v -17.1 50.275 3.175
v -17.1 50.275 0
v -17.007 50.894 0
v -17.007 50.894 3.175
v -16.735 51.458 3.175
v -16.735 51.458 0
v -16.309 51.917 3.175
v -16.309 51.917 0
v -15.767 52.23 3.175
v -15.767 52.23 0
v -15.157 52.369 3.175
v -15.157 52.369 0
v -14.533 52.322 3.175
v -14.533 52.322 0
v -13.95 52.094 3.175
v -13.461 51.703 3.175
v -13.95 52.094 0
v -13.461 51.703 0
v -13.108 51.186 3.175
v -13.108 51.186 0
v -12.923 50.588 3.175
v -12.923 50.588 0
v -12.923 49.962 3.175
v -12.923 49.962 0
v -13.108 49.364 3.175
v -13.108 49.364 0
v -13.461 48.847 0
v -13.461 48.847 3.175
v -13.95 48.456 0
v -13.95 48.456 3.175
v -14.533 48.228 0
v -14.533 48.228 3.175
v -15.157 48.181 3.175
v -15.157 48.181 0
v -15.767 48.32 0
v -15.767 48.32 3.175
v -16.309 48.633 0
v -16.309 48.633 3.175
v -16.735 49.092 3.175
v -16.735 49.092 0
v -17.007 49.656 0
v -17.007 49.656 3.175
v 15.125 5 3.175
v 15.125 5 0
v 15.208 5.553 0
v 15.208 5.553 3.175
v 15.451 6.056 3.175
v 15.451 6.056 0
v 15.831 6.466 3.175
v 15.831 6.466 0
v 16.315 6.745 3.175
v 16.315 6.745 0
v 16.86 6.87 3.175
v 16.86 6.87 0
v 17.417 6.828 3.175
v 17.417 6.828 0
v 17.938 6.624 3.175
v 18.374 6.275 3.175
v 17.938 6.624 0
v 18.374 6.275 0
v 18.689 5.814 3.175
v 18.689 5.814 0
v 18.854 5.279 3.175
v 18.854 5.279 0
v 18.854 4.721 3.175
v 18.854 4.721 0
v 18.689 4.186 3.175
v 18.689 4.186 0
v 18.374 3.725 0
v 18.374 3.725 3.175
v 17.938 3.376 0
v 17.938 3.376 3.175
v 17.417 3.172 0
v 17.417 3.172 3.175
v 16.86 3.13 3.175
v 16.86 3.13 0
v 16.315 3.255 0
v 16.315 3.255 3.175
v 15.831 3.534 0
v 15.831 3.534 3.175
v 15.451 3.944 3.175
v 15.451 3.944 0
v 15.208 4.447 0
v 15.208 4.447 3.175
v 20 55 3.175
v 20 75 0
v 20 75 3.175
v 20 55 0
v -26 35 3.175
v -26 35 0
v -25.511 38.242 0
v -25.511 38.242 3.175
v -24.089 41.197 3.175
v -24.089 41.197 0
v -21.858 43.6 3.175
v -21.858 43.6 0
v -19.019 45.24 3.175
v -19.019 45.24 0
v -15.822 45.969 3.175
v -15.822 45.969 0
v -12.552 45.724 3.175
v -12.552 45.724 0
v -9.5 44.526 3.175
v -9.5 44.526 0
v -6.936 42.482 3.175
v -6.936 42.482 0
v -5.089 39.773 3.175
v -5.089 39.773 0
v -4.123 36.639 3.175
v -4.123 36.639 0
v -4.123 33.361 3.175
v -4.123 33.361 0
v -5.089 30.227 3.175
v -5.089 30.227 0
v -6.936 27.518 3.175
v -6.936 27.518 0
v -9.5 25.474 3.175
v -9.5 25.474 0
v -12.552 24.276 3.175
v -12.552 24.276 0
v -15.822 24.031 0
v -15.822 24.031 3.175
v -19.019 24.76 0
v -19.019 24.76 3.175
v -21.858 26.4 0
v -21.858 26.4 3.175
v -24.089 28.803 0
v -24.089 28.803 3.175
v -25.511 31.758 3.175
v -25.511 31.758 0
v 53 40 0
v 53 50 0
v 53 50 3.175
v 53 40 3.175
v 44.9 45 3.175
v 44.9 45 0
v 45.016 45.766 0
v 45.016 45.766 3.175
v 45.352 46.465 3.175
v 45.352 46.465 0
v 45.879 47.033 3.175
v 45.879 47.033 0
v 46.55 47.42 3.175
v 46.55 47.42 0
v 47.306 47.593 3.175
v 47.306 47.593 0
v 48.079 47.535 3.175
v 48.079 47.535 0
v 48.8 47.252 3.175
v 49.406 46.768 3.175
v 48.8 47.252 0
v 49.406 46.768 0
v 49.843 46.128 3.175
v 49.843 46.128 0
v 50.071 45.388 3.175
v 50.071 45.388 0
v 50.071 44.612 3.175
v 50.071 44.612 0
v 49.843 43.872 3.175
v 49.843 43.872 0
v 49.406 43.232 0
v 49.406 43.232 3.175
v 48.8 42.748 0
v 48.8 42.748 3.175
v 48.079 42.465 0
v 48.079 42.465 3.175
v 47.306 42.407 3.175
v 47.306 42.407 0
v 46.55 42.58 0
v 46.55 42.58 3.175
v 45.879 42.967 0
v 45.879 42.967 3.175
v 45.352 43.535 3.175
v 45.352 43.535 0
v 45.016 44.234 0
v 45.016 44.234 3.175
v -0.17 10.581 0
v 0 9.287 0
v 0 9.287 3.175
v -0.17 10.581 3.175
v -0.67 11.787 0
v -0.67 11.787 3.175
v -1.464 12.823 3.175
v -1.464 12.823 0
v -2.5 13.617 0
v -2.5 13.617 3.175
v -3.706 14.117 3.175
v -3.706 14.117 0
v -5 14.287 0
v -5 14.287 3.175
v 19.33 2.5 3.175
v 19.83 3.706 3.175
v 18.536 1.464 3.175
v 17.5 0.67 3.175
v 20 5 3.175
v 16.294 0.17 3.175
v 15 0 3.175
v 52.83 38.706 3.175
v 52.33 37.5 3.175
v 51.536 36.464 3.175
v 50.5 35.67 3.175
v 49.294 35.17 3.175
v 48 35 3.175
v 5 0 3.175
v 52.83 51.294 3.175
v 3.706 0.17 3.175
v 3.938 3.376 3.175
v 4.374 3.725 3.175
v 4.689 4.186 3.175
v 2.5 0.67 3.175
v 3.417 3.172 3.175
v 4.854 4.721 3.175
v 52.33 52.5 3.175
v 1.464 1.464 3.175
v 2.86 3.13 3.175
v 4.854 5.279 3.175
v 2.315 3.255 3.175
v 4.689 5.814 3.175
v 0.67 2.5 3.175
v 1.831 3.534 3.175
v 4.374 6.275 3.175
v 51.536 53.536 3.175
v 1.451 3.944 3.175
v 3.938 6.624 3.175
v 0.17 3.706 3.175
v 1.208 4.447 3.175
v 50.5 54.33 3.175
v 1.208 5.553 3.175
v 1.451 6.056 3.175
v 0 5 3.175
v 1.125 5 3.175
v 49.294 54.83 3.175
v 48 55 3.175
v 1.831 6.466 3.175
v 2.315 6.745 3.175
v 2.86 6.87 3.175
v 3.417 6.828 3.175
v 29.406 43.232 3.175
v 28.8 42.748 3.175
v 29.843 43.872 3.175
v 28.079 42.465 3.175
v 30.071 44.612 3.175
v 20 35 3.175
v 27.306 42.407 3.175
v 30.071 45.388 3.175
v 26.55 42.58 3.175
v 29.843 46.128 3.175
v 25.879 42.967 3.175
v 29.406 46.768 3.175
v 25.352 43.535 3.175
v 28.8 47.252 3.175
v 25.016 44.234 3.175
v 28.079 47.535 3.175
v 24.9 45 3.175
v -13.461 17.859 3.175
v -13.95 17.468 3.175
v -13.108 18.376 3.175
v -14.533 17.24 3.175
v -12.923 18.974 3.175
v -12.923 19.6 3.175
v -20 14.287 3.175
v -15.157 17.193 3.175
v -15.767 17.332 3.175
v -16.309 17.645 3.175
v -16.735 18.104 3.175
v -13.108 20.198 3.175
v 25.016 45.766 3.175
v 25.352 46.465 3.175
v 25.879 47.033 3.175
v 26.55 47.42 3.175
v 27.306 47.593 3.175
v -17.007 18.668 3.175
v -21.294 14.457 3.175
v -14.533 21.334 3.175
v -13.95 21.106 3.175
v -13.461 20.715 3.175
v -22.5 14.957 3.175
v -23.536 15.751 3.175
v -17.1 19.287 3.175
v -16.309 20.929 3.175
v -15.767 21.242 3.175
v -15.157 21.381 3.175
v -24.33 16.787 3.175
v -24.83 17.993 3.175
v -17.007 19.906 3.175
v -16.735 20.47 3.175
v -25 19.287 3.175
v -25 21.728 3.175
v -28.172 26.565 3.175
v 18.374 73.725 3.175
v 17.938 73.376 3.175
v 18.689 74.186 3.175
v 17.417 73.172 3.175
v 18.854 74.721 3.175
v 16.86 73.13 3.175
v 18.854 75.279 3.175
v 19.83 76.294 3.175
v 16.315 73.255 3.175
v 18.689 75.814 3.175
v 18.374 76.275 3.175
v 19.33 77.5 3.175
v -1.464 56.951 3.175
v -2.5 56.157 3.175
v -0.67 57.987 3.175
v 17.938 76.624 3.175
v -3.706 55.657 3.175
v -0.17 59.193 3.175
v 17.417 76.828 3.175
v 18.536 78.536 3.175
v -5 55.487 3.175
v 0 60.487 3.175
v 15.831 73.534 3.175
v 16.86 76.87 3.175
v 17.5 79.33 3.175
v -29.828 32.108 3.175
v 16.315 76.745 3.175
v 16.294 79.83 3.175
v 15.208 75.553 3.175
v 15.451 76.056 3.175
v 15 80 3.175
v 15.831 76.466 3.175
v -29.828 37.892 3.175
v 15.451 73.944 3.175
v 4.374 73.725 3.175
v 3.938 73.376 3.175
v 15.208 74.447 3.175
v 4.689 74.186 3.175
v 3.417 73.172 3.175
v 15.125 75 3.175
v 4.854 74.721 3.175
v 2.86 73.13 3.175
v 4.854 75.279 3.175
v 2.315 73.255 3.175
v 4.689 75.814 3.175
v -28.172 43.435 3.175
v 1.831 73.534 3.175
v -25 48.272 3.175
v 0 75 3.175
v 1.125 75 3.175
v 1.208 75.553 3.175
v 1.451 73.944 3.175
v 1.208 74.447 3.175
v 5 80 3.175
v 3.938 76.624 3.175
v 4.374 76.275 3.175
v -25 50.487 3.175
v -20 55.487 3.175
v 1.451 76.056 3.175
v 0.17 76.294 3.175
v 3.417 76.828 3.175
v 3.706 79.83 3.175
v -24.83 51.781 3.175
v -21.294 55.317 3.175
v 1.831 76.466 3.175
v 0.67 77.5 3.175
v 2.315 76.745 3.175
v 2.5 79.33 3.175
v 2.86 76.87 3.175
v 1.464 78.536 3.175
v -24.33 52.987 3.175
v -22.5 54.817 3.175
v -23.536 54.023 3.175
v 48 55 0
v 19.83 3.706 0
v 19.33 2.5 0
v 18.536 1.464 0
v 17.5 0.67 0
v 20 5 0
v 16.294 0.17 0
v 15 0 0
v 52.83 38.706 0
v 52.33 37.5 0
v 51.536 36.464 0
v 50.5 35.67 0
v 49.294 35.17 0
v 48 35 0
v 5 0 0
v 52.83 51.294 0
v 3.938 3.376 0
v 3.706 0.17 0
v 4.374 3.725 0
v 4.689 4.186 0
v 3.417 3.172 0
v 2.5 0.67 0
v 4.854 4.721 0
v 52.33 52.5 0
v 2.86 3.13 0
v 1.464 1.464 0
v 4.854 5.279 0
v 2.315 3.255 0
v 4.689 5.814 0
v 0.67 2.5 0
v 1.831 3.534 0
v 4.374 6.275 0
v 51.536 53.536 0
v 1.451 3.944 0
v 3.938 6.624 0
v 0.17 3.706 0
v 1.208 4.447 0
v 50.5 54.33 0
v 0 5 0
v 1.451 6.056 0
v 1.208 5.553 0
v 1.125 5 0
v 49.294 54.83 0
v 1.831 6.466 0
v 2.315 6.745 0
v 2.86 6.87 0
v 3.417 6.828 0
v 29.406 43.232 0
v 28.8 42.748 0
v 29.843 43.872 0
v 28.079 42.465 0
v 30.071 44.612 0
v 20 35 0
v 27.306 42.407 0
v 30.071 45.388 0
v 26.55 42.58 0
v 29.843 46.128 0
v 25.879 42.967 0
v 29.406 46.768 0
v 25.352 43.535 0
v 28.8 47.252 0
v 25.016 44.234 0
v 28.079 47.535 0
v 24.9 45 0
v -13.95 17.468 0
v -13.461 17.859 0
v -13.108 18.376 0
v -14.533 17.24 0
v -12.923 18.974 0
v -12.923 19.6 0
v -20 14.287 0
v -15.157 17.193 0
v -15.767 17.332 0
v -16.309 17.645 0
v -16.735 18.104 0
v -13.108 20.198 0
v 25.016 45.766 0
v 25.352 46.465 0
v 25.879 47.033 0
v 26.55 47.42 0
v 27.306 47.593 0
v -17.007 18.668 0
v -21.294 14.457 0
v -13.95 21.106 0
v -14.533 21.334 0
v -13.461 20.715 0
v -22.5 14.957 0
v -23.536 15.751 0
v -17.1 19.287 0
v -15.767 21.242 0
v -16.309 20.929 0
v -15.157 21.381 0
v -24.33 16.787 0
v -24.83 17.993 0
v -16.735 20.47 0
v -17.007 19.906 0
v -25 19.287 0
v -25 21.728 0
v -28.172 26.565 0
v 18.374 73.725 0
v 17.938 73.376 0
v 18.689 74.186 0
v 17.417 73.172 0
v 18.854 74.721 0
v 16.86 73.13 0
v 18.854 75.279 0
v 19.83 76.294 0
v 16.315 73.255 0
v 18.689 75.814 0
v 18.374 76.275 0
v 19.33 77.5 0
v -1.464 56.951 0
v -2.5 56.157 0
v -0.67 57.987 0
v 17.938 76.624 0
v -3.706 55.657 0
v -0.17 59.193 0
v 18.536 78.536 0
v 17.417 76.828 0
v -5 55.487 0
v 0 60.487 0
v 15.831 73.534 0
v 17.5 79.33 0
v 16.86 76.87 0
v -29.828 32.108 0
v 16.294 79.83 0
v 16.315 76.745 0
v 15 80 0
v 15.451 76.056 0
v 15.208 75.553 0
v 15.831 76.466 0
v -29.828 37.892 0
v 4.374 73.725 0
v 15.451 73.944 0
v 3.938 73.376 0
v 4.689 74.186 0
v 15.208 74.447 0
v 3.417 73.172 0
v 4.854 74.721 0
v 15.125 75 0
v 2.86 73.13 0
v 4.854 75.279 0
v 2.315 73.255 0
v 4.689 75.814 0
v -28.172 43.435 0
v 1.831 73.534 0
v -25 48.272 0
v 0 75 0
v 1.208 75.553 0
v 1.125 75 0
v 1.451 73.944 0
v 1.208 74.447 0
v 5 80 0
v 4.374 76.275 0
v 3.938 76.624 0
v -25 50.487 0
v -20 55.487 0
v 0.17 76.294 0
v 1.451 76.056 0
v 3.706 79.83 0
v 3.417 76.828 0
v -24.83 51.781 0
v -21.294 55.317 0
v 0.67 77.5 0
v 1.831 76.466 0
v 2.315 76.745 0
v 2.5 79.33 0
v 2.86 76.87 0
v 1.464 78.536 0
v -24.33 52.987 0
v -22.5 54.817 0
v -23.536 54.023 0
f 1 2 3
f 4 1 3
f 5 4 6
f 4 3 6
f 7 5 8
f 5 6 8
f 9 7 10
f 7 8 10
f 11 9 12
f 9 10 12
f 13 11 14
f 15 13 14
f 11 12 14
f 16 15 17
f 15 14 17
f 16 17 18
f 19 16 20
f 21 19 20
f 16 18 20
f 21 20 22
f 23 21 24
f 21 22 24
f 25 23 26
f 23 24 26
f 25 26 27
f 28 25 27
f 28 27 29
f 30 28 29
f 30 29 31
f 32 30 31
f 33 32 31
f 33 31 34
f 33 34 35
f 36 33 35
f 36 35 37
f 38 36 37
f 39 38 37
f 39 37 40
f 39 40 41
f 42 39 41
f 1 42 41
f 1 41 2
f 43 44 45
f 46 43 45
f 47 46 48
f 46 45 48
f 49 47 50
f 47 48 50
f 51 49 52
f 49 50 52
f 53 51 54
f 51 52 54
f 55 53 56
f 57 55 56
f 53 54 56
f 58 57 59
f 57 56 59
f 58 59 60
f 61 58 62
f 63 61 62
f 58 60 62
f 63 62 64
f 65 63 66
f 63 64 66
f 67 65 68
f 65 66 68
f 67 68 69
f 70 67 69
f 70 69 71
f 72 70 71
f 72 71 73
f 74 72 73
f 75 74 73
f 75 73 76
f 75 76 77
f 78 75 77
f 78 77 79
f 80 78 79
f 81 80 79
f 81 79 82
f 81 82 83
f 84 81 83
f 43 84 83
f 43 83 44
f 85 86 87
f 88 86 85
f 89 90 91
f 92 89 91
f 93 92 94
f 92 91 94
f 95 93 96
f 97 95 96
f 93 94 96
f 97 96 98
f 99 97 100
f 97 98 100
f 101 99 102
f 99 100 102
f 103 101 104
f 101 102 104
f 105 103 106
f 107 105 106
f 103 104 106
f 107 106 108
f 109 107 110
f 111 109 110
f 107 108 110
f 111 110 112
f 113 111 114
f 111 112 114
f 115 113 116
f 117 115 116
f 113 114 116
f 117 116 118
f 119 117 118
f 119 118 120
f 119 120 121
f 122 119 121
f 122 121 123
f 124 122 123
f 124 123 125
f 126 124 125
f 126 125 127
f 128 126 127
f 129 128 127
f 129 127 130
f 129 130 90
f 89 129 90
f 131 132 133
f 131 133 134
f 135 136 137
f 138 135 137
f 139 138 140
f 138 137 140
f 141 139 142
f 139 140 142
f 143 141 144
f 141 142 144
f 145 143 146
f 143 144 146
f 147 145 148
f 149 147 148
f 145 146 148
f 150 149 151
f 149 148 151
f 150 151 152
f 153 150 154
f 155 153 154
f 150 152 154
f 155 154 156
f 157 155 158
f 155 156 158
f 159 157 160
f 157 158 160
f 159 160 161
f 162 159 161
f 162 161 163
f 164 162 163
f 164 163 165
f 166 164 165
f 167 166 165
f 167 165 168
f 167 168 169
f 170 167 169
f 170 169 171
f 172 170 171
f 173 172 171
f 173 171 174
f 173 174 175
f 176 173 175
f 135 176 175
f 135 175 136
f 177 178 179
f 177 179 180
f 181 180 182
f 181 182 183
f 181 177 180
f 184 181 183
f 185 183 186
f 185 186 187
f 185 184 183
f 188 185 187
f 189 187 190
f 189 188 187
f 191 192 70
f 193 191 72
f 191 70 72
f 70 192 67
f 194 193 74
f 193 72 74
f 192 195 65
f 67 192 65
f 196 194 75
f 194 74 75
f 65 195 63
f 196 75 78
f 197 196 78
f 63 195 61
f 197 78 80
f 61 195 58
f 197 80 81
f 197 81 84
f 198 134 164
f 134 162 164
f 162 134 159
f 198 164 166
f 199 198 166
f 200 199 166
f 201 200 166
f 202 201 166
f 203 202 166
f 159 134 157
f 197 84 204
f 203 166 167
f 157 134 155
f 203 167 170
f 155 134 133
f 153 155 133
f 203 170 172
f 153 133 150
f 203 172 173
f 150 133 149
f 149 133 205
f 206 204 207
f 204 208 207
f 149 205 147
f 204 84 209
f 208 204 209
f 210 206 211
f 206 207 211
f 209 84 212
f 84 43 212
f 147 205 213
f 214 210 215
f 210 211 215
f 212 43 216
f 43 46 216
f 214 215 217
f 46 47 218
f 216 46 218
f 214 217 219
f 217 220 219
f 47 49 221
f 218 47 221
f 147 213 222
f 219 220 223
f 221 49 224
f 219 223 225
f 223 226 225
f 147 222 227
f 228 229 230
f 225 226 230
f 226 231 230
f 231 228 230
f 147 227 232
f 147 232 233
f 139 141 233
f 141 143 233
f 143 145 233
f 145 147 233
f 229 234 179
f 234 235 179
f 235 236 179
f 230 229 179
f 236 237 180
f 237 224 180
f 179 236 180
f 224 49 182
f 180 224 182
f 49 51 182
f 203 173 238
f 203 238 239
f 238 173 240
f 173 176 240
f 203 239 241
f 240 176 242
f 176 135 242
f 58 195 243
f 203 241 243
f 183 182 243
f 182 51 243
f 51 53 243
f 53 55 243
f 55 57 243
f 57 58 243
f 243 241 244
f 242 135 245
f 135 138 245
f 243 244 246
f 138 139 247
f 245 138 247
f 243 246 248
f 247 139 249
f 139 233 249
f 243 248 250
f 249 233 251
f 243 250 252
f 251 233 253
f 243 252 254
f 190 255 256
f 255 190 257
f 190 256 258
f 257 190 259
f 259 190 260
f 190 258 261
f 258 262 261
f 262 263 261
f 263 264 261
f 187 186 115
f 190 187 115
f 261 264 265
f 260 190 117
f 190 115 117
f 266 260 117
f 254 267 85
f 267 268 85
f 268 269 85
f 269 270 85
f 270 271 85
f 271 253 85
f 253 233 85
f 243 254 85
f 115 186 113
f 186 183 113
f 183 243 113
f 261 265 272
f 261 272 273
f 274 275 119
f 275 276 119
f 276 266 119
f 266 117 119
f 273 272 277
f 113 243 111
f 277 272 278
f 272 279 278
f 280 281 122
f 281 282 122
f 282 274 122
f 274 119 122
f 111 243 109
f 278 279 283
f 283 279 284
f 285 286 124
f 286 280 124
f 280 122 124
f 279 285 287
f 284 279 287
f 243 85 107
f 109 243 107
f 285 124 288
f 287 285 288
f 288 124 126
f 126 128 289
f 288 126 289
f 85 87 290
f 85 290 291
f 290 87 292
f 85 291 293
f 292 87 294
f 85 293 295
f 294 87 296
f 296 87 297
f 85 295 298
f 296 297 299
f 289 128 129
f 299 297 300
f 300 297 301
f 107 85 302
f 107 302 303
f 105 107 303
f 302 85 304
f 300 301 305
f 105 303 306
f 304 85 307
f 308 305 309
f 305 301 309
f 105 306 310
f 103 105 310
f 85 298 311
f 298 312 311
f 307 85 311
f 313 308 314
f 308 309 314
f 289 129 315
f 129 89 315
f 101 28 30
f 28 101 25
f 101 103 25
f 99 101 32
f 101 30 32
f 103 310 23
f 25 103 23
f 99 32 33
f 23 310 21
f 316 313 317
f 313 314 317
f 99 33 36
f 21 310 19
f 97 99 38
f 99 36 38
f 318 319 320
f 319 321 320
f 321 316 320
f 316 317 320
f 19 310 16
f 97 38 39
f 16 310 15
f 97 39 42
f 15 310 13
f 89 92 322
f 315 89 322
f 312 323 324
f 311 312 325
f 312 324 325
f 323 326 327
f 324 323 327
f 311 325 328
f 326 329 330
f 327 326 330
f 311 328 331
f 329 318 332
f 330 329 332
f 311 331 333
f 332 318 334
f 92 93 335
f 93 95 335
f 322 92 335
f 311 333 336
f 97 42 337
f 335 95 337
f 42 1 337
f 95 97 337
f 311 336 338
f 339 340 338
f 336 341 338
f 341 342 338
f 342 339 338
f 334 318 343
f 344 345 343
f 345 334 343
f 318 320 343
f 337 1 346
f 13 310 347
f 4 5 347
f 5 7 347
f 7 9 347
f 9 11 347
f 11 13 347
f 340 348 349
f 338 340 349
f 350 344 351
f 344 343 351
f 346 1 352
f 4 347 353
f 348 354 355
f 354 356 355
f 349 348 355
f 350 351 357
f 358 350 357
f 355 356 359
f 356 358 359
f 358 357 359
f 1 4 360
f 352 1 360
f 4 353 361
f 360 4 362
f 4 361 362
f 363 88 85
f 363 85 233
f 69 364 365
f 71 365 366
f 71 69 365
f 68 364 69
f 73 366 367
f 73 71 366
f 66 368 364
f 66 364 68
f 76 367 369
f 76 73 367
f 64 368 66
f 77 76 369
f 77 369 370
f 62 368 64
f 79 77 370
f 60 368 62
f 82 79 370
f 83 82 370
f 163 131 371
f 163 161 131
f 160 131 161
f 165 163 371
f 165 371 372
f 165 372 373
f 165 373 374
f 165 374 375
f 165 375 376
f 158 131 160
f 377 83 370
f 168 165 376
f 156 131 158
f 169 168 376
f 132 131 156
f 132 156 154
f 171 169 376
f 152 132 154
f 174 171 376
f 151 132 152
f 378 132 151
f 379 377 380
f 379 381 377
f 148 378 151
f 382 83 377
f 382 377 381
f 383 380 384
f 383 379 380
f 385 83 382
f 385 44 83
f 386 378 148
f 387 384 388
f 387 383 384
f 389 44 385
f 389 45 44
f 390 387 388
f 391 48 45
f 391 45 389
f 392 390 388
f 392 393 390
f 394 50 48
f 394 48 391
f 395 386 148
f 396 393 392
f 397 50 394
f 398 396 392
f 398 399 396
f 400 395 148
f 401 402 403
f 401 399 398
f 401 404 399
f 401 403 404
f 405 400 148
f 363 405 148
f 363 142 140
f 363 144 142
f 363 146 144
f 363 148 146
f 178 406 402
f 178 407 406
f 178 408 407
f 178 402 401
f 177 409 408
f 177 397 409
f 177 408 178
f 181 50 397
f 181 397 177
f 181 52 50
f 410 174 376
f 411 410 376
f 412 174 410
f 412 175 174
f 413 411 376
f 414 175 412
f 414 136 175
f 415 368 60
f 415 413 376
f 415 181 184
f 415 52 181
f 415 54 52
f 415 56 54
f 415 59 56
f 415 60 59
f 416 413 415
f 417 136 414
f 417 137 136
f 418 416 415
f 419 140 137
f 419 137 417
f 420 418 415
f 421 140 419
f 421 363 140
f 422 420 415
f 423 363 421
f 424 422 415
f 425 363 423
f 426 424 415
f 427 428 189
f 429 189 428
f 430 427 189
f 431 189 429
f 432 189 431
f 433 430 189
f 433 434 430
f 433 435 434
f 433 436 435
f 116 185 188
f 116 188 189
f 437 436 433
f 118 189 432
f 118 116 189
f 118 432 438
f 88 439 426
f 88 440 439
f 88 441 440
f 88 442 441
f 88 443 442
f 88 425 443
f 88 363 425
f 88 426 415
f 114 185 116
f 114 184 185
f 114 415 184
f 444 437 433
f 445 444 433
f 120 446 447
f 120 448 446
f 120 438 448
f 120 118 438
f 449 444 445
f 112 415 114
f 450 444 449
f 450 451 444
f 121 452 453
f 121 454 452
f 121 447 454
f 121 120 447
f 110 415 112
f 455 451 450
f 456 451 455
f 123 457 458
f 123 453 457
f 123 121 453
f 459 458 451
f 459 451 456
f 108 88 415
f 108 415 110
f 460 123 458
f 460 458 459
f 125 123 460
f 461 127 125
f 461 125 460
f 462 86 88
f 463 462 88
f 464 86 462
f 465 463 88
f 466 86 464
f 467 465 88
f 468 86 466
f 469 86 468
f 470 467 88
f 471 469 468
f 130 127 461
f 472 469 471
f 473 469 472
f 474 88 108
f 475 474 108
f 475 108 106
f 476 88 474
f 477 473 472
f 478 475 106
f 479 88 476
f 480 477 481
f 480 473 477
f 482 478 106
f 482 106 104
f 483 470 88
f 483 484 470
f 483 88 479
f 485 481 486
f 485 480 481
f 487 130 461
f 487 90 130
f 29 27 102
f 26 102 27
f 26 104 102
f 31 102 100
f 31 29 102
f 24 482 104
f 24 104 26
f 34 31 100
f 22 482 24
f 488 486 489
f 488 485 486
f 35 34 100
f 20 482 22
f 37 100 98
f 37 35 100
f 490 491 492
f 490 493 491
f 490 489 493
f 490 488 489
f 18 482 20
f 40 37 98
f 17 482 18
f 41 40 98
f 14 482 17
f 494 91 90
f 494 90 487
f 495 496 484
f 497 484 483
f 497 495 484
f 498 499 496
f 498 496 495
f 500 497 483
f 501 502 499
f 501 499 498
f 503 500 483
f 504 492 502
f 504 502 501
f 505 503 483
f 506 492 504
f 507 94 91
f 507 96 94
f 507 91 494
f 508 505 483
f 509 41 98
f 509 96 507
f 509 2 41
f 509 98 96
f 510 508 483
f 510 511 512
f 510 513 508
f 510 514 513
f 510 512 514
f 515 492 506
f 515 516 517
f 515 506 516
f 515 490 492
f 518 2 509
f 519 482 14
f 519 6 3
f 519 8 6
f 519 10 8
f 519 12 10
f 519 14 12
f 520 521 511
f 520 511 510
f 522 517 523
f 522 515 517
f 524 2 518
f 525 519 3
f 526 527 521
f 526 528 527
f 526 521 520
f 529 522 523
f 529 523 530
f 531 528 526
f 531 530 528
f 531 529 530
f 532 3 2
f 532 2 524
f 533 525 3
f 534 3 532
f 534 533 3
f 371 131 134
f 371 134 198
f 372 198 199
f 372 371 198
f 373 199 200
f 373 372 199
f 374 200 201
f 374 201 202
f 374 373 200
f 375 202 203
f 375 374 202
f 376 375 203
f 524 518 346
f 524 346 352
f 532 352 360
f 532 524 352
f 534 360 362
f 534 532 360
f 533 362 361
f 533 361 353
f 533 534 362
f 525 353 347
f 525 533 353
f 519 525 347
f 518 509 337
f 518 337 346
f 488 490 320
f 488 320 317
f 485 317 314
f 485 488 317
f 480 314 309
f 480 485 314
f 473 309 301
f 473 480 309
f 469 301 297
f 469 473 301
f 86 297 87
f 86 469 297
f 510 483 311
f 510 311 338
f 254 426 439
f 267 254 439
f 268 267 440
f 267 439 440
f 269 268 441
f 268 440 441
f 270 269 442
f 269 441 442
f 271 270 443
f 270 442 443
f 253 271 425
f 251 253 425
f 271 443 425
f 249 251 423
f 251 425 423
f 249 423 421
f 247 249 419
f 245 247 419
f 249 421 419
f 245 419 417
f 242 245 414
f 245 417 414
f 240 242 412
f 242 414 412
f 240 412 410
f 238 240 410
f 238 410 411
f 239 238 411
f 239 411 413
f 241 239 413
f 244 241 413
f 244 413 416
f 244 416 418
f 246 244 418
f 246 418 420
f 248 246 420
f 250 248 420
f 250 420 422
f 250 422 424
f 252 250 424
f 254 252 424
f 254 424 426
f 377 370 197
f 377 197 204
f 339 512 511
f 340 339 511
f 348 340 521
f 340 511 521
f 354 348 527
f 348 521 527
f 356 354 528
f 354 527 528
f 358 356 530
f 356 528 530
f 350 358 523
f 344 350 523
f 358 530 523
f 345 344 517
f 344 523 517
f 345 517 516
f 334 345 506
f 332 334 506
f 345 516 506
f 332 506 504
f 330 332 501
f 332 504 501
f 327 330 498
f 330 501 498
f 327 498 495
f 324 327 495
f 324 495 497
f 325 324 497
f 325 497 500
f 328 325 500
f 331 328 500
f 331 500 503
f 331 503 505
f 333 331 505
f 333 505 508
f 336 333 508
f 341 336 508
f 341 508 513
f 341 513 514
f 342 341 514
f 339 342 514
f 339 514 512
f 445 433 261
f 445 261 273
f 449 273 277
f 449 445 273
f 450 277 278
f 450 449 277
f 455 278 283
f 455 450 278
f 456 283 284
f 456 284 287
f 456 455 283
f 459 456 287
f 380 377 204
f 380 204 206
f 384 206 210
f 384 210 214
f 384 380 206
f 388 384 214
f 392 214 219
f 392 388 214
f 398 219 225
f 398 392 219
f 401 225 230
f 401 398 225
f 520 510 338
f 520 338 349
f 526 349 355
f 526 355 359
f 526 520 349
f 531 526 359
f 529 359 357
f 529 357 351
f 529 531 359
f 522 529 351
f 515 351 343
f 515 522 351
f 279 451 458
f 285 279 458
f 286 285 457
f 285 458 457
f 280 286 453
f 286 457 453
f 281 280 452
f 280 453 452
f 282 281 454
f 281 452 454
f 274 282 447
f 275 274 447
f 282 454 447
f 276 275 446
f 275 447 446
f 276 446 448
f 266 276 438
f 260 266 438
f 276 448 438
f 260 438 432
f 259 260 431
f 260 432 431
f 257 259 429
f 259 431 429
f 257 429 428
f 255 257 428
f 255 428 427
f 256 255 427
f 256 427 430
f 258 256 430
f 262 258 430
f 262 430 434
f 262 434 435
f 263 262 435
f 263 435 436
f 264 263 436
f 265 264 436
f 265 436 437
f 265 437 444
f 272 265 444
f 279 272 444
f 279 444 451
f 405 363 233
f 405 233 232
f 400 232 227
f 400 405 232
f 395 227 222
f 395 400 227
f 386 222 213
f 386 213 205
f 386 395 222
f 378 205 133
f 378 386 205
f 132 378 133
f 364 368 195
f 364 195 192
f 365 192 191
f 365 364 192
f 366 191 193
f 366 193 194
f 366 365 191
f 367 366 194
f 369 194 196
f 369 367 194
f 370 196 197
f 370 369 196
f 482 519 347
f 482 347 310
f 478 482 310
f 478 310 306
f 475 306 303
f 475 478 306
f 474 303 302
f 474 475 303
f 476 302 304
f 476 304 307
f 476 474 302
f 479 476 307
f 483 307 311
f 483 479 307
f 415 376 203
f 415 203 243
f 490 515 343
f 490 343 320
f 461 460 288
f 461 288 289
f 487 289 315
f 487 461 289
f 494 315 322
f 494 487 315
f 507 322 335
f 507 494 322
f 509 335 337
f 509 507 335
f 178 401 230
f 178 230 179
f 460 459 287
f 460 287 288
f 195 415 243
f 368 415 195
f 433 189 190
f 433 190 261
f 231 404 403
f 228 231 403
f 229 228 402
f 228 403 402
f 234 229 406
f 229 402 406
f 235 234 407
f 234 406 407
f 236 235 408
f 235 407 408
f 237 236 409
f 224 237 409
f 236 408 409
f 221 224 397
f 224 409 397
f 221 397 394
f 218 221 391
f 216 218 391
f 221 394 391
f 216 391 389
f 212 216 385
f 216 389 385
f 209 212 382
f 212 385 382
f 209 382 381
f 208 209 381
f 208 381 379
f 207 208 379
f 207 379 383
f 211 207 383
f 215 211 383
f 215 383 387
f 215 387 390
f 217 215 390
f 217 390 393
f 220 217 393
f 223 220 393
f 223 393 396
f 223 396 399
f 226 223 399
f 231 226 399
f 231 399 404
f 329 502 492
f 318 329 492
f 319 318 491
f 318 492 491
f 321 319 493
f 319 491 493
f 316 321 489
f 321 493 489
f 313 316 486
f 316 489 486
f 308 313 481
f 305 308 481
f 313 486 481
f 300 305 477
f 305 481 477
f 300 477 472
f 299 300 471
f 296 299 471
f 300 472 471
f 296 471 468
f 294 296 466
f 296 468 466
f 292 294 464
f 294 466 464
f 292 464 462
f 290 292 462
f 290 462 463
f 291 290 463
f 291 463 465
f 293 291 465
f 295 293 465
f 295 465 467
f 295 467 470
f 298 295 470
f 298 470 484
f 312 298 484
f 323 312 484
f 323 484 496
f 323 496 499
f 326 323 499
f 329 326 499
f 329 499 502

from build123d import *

# Parameters (mm, degrees)
BASE_FLANGE1_DEPTH         = 3.175
M3_5_CLEARANCE_HOLE1_D     = 3.75
F_5_2_5_2_DIAMETER_HOLE1_D = 5.2
F_4_2_4_2_DIAMETER_HOLE1_D = 4.2
F_22_0_22_DIAMETER_HOLE1_D = 22


# Sheet-metal steps are written as plain solids
with BuildPart() as part:
    # Sketch11 → Base-Flange1 (new body)
    with BuildSketch(Plane(origin=(0, 0, 0), x_dir=(-1, 0, 0), z_dir=(0, 0, -1))):
        with BuildLine():
            Line((20, 55.487), (5, 55.487))
            ThreePointArc((5, 55.487), (1.464466094, 56.951466094), (0, 60.487))
            Line((0, 60.487), (0, 75))
            ThreePointArc((0, 75), (-1.464466094, 78.535533906), (-5, 80))
            Line((-5, 80), (-15, 80))
            ThreePointArc((-15, 80), (-18.535533906, 78.535533906), (-20, 75))
            Line((-20, 75), (-20, 55))
            Line((-20, 55), (-48, 55))
            ThreePointArc((-48, 55), (-51.535533906, 53.535533906), (-53, 50))
            Line((-53, 50), (-53, 40))
            ThreePointArc((-53, 40), (-51.535533906, 36.464466094), (-48, 35))
            Line((-48, 35), (-20, 35))
            Line((-20, 35), (-20, 5))
            ThreePointArc((-20, 5), (-18.535533906, 1.464466094), (-15, 0))
            Line((-15, 0), (-5, 0))
            ThreePointArc((-5, 0), (-1.464466094, 1.464466094), (0, 5))
            Line((0, 5), (0, 9.287))
            ThreePointArc((0, 9.287), (1.464466094, 12.822533906), (5, 14.287))
            Line((5, 14.287), (20, 14.287))
            ThreePointArc((20, 14.287), (23.535533906, 15.751466094), (25, 19.287))
            Line((25, 19.287), (25, 21.728499788))
            ThreePointArc((25, 21.728499788), (30.037804903, 35), (25, 48.271500212))
            Line((25, 48.271500212), (25, 50.487))
            ThreePointArc((25, 50.487), (23.535533906, 54.022533906), (20, 55.487))
        make_face()
    extrude(amount=-BASE_FLANGE1_DEPTH)

    # M3.5 Clearance Hole1 (through all)
    with Locations(Plane.XY.offset(3.175)):
        with Locations((17, 5), (3, 75), (3, 5), (17, 75)):
            Hole(M3_5_CLEARANCE_HOLE1_D / 2)

    # Ø5.2 (5.2) Diameter Hole1 (through all)
    with Locations(Plane.XY.offset(3.175)):
        with Locations((27.5, 45), (47.5, 45)):
            Hole(F_5_2_5_2_DIAMETER_HOLE1_D / 2)

    # Ø4.2 (4.2) Diameter Hole1 (through all)
    with Locations(Plane.XY.offset(3.175)):
        with Locations((-15, 19.287), (-15, 50.275)):
            Hole(F_4_2_4_2_DIAMETER_HOLE1_D / 2)

    # Ø22.0 (22) Diameter Hole1 (through all)
    with Locations(Plane.XY.offset(3.175)):
        with Locations((-15, 35)):
            Hole(F_22_0_22_DIAMETER_HOLE1_D / 2)


solid = part.part
